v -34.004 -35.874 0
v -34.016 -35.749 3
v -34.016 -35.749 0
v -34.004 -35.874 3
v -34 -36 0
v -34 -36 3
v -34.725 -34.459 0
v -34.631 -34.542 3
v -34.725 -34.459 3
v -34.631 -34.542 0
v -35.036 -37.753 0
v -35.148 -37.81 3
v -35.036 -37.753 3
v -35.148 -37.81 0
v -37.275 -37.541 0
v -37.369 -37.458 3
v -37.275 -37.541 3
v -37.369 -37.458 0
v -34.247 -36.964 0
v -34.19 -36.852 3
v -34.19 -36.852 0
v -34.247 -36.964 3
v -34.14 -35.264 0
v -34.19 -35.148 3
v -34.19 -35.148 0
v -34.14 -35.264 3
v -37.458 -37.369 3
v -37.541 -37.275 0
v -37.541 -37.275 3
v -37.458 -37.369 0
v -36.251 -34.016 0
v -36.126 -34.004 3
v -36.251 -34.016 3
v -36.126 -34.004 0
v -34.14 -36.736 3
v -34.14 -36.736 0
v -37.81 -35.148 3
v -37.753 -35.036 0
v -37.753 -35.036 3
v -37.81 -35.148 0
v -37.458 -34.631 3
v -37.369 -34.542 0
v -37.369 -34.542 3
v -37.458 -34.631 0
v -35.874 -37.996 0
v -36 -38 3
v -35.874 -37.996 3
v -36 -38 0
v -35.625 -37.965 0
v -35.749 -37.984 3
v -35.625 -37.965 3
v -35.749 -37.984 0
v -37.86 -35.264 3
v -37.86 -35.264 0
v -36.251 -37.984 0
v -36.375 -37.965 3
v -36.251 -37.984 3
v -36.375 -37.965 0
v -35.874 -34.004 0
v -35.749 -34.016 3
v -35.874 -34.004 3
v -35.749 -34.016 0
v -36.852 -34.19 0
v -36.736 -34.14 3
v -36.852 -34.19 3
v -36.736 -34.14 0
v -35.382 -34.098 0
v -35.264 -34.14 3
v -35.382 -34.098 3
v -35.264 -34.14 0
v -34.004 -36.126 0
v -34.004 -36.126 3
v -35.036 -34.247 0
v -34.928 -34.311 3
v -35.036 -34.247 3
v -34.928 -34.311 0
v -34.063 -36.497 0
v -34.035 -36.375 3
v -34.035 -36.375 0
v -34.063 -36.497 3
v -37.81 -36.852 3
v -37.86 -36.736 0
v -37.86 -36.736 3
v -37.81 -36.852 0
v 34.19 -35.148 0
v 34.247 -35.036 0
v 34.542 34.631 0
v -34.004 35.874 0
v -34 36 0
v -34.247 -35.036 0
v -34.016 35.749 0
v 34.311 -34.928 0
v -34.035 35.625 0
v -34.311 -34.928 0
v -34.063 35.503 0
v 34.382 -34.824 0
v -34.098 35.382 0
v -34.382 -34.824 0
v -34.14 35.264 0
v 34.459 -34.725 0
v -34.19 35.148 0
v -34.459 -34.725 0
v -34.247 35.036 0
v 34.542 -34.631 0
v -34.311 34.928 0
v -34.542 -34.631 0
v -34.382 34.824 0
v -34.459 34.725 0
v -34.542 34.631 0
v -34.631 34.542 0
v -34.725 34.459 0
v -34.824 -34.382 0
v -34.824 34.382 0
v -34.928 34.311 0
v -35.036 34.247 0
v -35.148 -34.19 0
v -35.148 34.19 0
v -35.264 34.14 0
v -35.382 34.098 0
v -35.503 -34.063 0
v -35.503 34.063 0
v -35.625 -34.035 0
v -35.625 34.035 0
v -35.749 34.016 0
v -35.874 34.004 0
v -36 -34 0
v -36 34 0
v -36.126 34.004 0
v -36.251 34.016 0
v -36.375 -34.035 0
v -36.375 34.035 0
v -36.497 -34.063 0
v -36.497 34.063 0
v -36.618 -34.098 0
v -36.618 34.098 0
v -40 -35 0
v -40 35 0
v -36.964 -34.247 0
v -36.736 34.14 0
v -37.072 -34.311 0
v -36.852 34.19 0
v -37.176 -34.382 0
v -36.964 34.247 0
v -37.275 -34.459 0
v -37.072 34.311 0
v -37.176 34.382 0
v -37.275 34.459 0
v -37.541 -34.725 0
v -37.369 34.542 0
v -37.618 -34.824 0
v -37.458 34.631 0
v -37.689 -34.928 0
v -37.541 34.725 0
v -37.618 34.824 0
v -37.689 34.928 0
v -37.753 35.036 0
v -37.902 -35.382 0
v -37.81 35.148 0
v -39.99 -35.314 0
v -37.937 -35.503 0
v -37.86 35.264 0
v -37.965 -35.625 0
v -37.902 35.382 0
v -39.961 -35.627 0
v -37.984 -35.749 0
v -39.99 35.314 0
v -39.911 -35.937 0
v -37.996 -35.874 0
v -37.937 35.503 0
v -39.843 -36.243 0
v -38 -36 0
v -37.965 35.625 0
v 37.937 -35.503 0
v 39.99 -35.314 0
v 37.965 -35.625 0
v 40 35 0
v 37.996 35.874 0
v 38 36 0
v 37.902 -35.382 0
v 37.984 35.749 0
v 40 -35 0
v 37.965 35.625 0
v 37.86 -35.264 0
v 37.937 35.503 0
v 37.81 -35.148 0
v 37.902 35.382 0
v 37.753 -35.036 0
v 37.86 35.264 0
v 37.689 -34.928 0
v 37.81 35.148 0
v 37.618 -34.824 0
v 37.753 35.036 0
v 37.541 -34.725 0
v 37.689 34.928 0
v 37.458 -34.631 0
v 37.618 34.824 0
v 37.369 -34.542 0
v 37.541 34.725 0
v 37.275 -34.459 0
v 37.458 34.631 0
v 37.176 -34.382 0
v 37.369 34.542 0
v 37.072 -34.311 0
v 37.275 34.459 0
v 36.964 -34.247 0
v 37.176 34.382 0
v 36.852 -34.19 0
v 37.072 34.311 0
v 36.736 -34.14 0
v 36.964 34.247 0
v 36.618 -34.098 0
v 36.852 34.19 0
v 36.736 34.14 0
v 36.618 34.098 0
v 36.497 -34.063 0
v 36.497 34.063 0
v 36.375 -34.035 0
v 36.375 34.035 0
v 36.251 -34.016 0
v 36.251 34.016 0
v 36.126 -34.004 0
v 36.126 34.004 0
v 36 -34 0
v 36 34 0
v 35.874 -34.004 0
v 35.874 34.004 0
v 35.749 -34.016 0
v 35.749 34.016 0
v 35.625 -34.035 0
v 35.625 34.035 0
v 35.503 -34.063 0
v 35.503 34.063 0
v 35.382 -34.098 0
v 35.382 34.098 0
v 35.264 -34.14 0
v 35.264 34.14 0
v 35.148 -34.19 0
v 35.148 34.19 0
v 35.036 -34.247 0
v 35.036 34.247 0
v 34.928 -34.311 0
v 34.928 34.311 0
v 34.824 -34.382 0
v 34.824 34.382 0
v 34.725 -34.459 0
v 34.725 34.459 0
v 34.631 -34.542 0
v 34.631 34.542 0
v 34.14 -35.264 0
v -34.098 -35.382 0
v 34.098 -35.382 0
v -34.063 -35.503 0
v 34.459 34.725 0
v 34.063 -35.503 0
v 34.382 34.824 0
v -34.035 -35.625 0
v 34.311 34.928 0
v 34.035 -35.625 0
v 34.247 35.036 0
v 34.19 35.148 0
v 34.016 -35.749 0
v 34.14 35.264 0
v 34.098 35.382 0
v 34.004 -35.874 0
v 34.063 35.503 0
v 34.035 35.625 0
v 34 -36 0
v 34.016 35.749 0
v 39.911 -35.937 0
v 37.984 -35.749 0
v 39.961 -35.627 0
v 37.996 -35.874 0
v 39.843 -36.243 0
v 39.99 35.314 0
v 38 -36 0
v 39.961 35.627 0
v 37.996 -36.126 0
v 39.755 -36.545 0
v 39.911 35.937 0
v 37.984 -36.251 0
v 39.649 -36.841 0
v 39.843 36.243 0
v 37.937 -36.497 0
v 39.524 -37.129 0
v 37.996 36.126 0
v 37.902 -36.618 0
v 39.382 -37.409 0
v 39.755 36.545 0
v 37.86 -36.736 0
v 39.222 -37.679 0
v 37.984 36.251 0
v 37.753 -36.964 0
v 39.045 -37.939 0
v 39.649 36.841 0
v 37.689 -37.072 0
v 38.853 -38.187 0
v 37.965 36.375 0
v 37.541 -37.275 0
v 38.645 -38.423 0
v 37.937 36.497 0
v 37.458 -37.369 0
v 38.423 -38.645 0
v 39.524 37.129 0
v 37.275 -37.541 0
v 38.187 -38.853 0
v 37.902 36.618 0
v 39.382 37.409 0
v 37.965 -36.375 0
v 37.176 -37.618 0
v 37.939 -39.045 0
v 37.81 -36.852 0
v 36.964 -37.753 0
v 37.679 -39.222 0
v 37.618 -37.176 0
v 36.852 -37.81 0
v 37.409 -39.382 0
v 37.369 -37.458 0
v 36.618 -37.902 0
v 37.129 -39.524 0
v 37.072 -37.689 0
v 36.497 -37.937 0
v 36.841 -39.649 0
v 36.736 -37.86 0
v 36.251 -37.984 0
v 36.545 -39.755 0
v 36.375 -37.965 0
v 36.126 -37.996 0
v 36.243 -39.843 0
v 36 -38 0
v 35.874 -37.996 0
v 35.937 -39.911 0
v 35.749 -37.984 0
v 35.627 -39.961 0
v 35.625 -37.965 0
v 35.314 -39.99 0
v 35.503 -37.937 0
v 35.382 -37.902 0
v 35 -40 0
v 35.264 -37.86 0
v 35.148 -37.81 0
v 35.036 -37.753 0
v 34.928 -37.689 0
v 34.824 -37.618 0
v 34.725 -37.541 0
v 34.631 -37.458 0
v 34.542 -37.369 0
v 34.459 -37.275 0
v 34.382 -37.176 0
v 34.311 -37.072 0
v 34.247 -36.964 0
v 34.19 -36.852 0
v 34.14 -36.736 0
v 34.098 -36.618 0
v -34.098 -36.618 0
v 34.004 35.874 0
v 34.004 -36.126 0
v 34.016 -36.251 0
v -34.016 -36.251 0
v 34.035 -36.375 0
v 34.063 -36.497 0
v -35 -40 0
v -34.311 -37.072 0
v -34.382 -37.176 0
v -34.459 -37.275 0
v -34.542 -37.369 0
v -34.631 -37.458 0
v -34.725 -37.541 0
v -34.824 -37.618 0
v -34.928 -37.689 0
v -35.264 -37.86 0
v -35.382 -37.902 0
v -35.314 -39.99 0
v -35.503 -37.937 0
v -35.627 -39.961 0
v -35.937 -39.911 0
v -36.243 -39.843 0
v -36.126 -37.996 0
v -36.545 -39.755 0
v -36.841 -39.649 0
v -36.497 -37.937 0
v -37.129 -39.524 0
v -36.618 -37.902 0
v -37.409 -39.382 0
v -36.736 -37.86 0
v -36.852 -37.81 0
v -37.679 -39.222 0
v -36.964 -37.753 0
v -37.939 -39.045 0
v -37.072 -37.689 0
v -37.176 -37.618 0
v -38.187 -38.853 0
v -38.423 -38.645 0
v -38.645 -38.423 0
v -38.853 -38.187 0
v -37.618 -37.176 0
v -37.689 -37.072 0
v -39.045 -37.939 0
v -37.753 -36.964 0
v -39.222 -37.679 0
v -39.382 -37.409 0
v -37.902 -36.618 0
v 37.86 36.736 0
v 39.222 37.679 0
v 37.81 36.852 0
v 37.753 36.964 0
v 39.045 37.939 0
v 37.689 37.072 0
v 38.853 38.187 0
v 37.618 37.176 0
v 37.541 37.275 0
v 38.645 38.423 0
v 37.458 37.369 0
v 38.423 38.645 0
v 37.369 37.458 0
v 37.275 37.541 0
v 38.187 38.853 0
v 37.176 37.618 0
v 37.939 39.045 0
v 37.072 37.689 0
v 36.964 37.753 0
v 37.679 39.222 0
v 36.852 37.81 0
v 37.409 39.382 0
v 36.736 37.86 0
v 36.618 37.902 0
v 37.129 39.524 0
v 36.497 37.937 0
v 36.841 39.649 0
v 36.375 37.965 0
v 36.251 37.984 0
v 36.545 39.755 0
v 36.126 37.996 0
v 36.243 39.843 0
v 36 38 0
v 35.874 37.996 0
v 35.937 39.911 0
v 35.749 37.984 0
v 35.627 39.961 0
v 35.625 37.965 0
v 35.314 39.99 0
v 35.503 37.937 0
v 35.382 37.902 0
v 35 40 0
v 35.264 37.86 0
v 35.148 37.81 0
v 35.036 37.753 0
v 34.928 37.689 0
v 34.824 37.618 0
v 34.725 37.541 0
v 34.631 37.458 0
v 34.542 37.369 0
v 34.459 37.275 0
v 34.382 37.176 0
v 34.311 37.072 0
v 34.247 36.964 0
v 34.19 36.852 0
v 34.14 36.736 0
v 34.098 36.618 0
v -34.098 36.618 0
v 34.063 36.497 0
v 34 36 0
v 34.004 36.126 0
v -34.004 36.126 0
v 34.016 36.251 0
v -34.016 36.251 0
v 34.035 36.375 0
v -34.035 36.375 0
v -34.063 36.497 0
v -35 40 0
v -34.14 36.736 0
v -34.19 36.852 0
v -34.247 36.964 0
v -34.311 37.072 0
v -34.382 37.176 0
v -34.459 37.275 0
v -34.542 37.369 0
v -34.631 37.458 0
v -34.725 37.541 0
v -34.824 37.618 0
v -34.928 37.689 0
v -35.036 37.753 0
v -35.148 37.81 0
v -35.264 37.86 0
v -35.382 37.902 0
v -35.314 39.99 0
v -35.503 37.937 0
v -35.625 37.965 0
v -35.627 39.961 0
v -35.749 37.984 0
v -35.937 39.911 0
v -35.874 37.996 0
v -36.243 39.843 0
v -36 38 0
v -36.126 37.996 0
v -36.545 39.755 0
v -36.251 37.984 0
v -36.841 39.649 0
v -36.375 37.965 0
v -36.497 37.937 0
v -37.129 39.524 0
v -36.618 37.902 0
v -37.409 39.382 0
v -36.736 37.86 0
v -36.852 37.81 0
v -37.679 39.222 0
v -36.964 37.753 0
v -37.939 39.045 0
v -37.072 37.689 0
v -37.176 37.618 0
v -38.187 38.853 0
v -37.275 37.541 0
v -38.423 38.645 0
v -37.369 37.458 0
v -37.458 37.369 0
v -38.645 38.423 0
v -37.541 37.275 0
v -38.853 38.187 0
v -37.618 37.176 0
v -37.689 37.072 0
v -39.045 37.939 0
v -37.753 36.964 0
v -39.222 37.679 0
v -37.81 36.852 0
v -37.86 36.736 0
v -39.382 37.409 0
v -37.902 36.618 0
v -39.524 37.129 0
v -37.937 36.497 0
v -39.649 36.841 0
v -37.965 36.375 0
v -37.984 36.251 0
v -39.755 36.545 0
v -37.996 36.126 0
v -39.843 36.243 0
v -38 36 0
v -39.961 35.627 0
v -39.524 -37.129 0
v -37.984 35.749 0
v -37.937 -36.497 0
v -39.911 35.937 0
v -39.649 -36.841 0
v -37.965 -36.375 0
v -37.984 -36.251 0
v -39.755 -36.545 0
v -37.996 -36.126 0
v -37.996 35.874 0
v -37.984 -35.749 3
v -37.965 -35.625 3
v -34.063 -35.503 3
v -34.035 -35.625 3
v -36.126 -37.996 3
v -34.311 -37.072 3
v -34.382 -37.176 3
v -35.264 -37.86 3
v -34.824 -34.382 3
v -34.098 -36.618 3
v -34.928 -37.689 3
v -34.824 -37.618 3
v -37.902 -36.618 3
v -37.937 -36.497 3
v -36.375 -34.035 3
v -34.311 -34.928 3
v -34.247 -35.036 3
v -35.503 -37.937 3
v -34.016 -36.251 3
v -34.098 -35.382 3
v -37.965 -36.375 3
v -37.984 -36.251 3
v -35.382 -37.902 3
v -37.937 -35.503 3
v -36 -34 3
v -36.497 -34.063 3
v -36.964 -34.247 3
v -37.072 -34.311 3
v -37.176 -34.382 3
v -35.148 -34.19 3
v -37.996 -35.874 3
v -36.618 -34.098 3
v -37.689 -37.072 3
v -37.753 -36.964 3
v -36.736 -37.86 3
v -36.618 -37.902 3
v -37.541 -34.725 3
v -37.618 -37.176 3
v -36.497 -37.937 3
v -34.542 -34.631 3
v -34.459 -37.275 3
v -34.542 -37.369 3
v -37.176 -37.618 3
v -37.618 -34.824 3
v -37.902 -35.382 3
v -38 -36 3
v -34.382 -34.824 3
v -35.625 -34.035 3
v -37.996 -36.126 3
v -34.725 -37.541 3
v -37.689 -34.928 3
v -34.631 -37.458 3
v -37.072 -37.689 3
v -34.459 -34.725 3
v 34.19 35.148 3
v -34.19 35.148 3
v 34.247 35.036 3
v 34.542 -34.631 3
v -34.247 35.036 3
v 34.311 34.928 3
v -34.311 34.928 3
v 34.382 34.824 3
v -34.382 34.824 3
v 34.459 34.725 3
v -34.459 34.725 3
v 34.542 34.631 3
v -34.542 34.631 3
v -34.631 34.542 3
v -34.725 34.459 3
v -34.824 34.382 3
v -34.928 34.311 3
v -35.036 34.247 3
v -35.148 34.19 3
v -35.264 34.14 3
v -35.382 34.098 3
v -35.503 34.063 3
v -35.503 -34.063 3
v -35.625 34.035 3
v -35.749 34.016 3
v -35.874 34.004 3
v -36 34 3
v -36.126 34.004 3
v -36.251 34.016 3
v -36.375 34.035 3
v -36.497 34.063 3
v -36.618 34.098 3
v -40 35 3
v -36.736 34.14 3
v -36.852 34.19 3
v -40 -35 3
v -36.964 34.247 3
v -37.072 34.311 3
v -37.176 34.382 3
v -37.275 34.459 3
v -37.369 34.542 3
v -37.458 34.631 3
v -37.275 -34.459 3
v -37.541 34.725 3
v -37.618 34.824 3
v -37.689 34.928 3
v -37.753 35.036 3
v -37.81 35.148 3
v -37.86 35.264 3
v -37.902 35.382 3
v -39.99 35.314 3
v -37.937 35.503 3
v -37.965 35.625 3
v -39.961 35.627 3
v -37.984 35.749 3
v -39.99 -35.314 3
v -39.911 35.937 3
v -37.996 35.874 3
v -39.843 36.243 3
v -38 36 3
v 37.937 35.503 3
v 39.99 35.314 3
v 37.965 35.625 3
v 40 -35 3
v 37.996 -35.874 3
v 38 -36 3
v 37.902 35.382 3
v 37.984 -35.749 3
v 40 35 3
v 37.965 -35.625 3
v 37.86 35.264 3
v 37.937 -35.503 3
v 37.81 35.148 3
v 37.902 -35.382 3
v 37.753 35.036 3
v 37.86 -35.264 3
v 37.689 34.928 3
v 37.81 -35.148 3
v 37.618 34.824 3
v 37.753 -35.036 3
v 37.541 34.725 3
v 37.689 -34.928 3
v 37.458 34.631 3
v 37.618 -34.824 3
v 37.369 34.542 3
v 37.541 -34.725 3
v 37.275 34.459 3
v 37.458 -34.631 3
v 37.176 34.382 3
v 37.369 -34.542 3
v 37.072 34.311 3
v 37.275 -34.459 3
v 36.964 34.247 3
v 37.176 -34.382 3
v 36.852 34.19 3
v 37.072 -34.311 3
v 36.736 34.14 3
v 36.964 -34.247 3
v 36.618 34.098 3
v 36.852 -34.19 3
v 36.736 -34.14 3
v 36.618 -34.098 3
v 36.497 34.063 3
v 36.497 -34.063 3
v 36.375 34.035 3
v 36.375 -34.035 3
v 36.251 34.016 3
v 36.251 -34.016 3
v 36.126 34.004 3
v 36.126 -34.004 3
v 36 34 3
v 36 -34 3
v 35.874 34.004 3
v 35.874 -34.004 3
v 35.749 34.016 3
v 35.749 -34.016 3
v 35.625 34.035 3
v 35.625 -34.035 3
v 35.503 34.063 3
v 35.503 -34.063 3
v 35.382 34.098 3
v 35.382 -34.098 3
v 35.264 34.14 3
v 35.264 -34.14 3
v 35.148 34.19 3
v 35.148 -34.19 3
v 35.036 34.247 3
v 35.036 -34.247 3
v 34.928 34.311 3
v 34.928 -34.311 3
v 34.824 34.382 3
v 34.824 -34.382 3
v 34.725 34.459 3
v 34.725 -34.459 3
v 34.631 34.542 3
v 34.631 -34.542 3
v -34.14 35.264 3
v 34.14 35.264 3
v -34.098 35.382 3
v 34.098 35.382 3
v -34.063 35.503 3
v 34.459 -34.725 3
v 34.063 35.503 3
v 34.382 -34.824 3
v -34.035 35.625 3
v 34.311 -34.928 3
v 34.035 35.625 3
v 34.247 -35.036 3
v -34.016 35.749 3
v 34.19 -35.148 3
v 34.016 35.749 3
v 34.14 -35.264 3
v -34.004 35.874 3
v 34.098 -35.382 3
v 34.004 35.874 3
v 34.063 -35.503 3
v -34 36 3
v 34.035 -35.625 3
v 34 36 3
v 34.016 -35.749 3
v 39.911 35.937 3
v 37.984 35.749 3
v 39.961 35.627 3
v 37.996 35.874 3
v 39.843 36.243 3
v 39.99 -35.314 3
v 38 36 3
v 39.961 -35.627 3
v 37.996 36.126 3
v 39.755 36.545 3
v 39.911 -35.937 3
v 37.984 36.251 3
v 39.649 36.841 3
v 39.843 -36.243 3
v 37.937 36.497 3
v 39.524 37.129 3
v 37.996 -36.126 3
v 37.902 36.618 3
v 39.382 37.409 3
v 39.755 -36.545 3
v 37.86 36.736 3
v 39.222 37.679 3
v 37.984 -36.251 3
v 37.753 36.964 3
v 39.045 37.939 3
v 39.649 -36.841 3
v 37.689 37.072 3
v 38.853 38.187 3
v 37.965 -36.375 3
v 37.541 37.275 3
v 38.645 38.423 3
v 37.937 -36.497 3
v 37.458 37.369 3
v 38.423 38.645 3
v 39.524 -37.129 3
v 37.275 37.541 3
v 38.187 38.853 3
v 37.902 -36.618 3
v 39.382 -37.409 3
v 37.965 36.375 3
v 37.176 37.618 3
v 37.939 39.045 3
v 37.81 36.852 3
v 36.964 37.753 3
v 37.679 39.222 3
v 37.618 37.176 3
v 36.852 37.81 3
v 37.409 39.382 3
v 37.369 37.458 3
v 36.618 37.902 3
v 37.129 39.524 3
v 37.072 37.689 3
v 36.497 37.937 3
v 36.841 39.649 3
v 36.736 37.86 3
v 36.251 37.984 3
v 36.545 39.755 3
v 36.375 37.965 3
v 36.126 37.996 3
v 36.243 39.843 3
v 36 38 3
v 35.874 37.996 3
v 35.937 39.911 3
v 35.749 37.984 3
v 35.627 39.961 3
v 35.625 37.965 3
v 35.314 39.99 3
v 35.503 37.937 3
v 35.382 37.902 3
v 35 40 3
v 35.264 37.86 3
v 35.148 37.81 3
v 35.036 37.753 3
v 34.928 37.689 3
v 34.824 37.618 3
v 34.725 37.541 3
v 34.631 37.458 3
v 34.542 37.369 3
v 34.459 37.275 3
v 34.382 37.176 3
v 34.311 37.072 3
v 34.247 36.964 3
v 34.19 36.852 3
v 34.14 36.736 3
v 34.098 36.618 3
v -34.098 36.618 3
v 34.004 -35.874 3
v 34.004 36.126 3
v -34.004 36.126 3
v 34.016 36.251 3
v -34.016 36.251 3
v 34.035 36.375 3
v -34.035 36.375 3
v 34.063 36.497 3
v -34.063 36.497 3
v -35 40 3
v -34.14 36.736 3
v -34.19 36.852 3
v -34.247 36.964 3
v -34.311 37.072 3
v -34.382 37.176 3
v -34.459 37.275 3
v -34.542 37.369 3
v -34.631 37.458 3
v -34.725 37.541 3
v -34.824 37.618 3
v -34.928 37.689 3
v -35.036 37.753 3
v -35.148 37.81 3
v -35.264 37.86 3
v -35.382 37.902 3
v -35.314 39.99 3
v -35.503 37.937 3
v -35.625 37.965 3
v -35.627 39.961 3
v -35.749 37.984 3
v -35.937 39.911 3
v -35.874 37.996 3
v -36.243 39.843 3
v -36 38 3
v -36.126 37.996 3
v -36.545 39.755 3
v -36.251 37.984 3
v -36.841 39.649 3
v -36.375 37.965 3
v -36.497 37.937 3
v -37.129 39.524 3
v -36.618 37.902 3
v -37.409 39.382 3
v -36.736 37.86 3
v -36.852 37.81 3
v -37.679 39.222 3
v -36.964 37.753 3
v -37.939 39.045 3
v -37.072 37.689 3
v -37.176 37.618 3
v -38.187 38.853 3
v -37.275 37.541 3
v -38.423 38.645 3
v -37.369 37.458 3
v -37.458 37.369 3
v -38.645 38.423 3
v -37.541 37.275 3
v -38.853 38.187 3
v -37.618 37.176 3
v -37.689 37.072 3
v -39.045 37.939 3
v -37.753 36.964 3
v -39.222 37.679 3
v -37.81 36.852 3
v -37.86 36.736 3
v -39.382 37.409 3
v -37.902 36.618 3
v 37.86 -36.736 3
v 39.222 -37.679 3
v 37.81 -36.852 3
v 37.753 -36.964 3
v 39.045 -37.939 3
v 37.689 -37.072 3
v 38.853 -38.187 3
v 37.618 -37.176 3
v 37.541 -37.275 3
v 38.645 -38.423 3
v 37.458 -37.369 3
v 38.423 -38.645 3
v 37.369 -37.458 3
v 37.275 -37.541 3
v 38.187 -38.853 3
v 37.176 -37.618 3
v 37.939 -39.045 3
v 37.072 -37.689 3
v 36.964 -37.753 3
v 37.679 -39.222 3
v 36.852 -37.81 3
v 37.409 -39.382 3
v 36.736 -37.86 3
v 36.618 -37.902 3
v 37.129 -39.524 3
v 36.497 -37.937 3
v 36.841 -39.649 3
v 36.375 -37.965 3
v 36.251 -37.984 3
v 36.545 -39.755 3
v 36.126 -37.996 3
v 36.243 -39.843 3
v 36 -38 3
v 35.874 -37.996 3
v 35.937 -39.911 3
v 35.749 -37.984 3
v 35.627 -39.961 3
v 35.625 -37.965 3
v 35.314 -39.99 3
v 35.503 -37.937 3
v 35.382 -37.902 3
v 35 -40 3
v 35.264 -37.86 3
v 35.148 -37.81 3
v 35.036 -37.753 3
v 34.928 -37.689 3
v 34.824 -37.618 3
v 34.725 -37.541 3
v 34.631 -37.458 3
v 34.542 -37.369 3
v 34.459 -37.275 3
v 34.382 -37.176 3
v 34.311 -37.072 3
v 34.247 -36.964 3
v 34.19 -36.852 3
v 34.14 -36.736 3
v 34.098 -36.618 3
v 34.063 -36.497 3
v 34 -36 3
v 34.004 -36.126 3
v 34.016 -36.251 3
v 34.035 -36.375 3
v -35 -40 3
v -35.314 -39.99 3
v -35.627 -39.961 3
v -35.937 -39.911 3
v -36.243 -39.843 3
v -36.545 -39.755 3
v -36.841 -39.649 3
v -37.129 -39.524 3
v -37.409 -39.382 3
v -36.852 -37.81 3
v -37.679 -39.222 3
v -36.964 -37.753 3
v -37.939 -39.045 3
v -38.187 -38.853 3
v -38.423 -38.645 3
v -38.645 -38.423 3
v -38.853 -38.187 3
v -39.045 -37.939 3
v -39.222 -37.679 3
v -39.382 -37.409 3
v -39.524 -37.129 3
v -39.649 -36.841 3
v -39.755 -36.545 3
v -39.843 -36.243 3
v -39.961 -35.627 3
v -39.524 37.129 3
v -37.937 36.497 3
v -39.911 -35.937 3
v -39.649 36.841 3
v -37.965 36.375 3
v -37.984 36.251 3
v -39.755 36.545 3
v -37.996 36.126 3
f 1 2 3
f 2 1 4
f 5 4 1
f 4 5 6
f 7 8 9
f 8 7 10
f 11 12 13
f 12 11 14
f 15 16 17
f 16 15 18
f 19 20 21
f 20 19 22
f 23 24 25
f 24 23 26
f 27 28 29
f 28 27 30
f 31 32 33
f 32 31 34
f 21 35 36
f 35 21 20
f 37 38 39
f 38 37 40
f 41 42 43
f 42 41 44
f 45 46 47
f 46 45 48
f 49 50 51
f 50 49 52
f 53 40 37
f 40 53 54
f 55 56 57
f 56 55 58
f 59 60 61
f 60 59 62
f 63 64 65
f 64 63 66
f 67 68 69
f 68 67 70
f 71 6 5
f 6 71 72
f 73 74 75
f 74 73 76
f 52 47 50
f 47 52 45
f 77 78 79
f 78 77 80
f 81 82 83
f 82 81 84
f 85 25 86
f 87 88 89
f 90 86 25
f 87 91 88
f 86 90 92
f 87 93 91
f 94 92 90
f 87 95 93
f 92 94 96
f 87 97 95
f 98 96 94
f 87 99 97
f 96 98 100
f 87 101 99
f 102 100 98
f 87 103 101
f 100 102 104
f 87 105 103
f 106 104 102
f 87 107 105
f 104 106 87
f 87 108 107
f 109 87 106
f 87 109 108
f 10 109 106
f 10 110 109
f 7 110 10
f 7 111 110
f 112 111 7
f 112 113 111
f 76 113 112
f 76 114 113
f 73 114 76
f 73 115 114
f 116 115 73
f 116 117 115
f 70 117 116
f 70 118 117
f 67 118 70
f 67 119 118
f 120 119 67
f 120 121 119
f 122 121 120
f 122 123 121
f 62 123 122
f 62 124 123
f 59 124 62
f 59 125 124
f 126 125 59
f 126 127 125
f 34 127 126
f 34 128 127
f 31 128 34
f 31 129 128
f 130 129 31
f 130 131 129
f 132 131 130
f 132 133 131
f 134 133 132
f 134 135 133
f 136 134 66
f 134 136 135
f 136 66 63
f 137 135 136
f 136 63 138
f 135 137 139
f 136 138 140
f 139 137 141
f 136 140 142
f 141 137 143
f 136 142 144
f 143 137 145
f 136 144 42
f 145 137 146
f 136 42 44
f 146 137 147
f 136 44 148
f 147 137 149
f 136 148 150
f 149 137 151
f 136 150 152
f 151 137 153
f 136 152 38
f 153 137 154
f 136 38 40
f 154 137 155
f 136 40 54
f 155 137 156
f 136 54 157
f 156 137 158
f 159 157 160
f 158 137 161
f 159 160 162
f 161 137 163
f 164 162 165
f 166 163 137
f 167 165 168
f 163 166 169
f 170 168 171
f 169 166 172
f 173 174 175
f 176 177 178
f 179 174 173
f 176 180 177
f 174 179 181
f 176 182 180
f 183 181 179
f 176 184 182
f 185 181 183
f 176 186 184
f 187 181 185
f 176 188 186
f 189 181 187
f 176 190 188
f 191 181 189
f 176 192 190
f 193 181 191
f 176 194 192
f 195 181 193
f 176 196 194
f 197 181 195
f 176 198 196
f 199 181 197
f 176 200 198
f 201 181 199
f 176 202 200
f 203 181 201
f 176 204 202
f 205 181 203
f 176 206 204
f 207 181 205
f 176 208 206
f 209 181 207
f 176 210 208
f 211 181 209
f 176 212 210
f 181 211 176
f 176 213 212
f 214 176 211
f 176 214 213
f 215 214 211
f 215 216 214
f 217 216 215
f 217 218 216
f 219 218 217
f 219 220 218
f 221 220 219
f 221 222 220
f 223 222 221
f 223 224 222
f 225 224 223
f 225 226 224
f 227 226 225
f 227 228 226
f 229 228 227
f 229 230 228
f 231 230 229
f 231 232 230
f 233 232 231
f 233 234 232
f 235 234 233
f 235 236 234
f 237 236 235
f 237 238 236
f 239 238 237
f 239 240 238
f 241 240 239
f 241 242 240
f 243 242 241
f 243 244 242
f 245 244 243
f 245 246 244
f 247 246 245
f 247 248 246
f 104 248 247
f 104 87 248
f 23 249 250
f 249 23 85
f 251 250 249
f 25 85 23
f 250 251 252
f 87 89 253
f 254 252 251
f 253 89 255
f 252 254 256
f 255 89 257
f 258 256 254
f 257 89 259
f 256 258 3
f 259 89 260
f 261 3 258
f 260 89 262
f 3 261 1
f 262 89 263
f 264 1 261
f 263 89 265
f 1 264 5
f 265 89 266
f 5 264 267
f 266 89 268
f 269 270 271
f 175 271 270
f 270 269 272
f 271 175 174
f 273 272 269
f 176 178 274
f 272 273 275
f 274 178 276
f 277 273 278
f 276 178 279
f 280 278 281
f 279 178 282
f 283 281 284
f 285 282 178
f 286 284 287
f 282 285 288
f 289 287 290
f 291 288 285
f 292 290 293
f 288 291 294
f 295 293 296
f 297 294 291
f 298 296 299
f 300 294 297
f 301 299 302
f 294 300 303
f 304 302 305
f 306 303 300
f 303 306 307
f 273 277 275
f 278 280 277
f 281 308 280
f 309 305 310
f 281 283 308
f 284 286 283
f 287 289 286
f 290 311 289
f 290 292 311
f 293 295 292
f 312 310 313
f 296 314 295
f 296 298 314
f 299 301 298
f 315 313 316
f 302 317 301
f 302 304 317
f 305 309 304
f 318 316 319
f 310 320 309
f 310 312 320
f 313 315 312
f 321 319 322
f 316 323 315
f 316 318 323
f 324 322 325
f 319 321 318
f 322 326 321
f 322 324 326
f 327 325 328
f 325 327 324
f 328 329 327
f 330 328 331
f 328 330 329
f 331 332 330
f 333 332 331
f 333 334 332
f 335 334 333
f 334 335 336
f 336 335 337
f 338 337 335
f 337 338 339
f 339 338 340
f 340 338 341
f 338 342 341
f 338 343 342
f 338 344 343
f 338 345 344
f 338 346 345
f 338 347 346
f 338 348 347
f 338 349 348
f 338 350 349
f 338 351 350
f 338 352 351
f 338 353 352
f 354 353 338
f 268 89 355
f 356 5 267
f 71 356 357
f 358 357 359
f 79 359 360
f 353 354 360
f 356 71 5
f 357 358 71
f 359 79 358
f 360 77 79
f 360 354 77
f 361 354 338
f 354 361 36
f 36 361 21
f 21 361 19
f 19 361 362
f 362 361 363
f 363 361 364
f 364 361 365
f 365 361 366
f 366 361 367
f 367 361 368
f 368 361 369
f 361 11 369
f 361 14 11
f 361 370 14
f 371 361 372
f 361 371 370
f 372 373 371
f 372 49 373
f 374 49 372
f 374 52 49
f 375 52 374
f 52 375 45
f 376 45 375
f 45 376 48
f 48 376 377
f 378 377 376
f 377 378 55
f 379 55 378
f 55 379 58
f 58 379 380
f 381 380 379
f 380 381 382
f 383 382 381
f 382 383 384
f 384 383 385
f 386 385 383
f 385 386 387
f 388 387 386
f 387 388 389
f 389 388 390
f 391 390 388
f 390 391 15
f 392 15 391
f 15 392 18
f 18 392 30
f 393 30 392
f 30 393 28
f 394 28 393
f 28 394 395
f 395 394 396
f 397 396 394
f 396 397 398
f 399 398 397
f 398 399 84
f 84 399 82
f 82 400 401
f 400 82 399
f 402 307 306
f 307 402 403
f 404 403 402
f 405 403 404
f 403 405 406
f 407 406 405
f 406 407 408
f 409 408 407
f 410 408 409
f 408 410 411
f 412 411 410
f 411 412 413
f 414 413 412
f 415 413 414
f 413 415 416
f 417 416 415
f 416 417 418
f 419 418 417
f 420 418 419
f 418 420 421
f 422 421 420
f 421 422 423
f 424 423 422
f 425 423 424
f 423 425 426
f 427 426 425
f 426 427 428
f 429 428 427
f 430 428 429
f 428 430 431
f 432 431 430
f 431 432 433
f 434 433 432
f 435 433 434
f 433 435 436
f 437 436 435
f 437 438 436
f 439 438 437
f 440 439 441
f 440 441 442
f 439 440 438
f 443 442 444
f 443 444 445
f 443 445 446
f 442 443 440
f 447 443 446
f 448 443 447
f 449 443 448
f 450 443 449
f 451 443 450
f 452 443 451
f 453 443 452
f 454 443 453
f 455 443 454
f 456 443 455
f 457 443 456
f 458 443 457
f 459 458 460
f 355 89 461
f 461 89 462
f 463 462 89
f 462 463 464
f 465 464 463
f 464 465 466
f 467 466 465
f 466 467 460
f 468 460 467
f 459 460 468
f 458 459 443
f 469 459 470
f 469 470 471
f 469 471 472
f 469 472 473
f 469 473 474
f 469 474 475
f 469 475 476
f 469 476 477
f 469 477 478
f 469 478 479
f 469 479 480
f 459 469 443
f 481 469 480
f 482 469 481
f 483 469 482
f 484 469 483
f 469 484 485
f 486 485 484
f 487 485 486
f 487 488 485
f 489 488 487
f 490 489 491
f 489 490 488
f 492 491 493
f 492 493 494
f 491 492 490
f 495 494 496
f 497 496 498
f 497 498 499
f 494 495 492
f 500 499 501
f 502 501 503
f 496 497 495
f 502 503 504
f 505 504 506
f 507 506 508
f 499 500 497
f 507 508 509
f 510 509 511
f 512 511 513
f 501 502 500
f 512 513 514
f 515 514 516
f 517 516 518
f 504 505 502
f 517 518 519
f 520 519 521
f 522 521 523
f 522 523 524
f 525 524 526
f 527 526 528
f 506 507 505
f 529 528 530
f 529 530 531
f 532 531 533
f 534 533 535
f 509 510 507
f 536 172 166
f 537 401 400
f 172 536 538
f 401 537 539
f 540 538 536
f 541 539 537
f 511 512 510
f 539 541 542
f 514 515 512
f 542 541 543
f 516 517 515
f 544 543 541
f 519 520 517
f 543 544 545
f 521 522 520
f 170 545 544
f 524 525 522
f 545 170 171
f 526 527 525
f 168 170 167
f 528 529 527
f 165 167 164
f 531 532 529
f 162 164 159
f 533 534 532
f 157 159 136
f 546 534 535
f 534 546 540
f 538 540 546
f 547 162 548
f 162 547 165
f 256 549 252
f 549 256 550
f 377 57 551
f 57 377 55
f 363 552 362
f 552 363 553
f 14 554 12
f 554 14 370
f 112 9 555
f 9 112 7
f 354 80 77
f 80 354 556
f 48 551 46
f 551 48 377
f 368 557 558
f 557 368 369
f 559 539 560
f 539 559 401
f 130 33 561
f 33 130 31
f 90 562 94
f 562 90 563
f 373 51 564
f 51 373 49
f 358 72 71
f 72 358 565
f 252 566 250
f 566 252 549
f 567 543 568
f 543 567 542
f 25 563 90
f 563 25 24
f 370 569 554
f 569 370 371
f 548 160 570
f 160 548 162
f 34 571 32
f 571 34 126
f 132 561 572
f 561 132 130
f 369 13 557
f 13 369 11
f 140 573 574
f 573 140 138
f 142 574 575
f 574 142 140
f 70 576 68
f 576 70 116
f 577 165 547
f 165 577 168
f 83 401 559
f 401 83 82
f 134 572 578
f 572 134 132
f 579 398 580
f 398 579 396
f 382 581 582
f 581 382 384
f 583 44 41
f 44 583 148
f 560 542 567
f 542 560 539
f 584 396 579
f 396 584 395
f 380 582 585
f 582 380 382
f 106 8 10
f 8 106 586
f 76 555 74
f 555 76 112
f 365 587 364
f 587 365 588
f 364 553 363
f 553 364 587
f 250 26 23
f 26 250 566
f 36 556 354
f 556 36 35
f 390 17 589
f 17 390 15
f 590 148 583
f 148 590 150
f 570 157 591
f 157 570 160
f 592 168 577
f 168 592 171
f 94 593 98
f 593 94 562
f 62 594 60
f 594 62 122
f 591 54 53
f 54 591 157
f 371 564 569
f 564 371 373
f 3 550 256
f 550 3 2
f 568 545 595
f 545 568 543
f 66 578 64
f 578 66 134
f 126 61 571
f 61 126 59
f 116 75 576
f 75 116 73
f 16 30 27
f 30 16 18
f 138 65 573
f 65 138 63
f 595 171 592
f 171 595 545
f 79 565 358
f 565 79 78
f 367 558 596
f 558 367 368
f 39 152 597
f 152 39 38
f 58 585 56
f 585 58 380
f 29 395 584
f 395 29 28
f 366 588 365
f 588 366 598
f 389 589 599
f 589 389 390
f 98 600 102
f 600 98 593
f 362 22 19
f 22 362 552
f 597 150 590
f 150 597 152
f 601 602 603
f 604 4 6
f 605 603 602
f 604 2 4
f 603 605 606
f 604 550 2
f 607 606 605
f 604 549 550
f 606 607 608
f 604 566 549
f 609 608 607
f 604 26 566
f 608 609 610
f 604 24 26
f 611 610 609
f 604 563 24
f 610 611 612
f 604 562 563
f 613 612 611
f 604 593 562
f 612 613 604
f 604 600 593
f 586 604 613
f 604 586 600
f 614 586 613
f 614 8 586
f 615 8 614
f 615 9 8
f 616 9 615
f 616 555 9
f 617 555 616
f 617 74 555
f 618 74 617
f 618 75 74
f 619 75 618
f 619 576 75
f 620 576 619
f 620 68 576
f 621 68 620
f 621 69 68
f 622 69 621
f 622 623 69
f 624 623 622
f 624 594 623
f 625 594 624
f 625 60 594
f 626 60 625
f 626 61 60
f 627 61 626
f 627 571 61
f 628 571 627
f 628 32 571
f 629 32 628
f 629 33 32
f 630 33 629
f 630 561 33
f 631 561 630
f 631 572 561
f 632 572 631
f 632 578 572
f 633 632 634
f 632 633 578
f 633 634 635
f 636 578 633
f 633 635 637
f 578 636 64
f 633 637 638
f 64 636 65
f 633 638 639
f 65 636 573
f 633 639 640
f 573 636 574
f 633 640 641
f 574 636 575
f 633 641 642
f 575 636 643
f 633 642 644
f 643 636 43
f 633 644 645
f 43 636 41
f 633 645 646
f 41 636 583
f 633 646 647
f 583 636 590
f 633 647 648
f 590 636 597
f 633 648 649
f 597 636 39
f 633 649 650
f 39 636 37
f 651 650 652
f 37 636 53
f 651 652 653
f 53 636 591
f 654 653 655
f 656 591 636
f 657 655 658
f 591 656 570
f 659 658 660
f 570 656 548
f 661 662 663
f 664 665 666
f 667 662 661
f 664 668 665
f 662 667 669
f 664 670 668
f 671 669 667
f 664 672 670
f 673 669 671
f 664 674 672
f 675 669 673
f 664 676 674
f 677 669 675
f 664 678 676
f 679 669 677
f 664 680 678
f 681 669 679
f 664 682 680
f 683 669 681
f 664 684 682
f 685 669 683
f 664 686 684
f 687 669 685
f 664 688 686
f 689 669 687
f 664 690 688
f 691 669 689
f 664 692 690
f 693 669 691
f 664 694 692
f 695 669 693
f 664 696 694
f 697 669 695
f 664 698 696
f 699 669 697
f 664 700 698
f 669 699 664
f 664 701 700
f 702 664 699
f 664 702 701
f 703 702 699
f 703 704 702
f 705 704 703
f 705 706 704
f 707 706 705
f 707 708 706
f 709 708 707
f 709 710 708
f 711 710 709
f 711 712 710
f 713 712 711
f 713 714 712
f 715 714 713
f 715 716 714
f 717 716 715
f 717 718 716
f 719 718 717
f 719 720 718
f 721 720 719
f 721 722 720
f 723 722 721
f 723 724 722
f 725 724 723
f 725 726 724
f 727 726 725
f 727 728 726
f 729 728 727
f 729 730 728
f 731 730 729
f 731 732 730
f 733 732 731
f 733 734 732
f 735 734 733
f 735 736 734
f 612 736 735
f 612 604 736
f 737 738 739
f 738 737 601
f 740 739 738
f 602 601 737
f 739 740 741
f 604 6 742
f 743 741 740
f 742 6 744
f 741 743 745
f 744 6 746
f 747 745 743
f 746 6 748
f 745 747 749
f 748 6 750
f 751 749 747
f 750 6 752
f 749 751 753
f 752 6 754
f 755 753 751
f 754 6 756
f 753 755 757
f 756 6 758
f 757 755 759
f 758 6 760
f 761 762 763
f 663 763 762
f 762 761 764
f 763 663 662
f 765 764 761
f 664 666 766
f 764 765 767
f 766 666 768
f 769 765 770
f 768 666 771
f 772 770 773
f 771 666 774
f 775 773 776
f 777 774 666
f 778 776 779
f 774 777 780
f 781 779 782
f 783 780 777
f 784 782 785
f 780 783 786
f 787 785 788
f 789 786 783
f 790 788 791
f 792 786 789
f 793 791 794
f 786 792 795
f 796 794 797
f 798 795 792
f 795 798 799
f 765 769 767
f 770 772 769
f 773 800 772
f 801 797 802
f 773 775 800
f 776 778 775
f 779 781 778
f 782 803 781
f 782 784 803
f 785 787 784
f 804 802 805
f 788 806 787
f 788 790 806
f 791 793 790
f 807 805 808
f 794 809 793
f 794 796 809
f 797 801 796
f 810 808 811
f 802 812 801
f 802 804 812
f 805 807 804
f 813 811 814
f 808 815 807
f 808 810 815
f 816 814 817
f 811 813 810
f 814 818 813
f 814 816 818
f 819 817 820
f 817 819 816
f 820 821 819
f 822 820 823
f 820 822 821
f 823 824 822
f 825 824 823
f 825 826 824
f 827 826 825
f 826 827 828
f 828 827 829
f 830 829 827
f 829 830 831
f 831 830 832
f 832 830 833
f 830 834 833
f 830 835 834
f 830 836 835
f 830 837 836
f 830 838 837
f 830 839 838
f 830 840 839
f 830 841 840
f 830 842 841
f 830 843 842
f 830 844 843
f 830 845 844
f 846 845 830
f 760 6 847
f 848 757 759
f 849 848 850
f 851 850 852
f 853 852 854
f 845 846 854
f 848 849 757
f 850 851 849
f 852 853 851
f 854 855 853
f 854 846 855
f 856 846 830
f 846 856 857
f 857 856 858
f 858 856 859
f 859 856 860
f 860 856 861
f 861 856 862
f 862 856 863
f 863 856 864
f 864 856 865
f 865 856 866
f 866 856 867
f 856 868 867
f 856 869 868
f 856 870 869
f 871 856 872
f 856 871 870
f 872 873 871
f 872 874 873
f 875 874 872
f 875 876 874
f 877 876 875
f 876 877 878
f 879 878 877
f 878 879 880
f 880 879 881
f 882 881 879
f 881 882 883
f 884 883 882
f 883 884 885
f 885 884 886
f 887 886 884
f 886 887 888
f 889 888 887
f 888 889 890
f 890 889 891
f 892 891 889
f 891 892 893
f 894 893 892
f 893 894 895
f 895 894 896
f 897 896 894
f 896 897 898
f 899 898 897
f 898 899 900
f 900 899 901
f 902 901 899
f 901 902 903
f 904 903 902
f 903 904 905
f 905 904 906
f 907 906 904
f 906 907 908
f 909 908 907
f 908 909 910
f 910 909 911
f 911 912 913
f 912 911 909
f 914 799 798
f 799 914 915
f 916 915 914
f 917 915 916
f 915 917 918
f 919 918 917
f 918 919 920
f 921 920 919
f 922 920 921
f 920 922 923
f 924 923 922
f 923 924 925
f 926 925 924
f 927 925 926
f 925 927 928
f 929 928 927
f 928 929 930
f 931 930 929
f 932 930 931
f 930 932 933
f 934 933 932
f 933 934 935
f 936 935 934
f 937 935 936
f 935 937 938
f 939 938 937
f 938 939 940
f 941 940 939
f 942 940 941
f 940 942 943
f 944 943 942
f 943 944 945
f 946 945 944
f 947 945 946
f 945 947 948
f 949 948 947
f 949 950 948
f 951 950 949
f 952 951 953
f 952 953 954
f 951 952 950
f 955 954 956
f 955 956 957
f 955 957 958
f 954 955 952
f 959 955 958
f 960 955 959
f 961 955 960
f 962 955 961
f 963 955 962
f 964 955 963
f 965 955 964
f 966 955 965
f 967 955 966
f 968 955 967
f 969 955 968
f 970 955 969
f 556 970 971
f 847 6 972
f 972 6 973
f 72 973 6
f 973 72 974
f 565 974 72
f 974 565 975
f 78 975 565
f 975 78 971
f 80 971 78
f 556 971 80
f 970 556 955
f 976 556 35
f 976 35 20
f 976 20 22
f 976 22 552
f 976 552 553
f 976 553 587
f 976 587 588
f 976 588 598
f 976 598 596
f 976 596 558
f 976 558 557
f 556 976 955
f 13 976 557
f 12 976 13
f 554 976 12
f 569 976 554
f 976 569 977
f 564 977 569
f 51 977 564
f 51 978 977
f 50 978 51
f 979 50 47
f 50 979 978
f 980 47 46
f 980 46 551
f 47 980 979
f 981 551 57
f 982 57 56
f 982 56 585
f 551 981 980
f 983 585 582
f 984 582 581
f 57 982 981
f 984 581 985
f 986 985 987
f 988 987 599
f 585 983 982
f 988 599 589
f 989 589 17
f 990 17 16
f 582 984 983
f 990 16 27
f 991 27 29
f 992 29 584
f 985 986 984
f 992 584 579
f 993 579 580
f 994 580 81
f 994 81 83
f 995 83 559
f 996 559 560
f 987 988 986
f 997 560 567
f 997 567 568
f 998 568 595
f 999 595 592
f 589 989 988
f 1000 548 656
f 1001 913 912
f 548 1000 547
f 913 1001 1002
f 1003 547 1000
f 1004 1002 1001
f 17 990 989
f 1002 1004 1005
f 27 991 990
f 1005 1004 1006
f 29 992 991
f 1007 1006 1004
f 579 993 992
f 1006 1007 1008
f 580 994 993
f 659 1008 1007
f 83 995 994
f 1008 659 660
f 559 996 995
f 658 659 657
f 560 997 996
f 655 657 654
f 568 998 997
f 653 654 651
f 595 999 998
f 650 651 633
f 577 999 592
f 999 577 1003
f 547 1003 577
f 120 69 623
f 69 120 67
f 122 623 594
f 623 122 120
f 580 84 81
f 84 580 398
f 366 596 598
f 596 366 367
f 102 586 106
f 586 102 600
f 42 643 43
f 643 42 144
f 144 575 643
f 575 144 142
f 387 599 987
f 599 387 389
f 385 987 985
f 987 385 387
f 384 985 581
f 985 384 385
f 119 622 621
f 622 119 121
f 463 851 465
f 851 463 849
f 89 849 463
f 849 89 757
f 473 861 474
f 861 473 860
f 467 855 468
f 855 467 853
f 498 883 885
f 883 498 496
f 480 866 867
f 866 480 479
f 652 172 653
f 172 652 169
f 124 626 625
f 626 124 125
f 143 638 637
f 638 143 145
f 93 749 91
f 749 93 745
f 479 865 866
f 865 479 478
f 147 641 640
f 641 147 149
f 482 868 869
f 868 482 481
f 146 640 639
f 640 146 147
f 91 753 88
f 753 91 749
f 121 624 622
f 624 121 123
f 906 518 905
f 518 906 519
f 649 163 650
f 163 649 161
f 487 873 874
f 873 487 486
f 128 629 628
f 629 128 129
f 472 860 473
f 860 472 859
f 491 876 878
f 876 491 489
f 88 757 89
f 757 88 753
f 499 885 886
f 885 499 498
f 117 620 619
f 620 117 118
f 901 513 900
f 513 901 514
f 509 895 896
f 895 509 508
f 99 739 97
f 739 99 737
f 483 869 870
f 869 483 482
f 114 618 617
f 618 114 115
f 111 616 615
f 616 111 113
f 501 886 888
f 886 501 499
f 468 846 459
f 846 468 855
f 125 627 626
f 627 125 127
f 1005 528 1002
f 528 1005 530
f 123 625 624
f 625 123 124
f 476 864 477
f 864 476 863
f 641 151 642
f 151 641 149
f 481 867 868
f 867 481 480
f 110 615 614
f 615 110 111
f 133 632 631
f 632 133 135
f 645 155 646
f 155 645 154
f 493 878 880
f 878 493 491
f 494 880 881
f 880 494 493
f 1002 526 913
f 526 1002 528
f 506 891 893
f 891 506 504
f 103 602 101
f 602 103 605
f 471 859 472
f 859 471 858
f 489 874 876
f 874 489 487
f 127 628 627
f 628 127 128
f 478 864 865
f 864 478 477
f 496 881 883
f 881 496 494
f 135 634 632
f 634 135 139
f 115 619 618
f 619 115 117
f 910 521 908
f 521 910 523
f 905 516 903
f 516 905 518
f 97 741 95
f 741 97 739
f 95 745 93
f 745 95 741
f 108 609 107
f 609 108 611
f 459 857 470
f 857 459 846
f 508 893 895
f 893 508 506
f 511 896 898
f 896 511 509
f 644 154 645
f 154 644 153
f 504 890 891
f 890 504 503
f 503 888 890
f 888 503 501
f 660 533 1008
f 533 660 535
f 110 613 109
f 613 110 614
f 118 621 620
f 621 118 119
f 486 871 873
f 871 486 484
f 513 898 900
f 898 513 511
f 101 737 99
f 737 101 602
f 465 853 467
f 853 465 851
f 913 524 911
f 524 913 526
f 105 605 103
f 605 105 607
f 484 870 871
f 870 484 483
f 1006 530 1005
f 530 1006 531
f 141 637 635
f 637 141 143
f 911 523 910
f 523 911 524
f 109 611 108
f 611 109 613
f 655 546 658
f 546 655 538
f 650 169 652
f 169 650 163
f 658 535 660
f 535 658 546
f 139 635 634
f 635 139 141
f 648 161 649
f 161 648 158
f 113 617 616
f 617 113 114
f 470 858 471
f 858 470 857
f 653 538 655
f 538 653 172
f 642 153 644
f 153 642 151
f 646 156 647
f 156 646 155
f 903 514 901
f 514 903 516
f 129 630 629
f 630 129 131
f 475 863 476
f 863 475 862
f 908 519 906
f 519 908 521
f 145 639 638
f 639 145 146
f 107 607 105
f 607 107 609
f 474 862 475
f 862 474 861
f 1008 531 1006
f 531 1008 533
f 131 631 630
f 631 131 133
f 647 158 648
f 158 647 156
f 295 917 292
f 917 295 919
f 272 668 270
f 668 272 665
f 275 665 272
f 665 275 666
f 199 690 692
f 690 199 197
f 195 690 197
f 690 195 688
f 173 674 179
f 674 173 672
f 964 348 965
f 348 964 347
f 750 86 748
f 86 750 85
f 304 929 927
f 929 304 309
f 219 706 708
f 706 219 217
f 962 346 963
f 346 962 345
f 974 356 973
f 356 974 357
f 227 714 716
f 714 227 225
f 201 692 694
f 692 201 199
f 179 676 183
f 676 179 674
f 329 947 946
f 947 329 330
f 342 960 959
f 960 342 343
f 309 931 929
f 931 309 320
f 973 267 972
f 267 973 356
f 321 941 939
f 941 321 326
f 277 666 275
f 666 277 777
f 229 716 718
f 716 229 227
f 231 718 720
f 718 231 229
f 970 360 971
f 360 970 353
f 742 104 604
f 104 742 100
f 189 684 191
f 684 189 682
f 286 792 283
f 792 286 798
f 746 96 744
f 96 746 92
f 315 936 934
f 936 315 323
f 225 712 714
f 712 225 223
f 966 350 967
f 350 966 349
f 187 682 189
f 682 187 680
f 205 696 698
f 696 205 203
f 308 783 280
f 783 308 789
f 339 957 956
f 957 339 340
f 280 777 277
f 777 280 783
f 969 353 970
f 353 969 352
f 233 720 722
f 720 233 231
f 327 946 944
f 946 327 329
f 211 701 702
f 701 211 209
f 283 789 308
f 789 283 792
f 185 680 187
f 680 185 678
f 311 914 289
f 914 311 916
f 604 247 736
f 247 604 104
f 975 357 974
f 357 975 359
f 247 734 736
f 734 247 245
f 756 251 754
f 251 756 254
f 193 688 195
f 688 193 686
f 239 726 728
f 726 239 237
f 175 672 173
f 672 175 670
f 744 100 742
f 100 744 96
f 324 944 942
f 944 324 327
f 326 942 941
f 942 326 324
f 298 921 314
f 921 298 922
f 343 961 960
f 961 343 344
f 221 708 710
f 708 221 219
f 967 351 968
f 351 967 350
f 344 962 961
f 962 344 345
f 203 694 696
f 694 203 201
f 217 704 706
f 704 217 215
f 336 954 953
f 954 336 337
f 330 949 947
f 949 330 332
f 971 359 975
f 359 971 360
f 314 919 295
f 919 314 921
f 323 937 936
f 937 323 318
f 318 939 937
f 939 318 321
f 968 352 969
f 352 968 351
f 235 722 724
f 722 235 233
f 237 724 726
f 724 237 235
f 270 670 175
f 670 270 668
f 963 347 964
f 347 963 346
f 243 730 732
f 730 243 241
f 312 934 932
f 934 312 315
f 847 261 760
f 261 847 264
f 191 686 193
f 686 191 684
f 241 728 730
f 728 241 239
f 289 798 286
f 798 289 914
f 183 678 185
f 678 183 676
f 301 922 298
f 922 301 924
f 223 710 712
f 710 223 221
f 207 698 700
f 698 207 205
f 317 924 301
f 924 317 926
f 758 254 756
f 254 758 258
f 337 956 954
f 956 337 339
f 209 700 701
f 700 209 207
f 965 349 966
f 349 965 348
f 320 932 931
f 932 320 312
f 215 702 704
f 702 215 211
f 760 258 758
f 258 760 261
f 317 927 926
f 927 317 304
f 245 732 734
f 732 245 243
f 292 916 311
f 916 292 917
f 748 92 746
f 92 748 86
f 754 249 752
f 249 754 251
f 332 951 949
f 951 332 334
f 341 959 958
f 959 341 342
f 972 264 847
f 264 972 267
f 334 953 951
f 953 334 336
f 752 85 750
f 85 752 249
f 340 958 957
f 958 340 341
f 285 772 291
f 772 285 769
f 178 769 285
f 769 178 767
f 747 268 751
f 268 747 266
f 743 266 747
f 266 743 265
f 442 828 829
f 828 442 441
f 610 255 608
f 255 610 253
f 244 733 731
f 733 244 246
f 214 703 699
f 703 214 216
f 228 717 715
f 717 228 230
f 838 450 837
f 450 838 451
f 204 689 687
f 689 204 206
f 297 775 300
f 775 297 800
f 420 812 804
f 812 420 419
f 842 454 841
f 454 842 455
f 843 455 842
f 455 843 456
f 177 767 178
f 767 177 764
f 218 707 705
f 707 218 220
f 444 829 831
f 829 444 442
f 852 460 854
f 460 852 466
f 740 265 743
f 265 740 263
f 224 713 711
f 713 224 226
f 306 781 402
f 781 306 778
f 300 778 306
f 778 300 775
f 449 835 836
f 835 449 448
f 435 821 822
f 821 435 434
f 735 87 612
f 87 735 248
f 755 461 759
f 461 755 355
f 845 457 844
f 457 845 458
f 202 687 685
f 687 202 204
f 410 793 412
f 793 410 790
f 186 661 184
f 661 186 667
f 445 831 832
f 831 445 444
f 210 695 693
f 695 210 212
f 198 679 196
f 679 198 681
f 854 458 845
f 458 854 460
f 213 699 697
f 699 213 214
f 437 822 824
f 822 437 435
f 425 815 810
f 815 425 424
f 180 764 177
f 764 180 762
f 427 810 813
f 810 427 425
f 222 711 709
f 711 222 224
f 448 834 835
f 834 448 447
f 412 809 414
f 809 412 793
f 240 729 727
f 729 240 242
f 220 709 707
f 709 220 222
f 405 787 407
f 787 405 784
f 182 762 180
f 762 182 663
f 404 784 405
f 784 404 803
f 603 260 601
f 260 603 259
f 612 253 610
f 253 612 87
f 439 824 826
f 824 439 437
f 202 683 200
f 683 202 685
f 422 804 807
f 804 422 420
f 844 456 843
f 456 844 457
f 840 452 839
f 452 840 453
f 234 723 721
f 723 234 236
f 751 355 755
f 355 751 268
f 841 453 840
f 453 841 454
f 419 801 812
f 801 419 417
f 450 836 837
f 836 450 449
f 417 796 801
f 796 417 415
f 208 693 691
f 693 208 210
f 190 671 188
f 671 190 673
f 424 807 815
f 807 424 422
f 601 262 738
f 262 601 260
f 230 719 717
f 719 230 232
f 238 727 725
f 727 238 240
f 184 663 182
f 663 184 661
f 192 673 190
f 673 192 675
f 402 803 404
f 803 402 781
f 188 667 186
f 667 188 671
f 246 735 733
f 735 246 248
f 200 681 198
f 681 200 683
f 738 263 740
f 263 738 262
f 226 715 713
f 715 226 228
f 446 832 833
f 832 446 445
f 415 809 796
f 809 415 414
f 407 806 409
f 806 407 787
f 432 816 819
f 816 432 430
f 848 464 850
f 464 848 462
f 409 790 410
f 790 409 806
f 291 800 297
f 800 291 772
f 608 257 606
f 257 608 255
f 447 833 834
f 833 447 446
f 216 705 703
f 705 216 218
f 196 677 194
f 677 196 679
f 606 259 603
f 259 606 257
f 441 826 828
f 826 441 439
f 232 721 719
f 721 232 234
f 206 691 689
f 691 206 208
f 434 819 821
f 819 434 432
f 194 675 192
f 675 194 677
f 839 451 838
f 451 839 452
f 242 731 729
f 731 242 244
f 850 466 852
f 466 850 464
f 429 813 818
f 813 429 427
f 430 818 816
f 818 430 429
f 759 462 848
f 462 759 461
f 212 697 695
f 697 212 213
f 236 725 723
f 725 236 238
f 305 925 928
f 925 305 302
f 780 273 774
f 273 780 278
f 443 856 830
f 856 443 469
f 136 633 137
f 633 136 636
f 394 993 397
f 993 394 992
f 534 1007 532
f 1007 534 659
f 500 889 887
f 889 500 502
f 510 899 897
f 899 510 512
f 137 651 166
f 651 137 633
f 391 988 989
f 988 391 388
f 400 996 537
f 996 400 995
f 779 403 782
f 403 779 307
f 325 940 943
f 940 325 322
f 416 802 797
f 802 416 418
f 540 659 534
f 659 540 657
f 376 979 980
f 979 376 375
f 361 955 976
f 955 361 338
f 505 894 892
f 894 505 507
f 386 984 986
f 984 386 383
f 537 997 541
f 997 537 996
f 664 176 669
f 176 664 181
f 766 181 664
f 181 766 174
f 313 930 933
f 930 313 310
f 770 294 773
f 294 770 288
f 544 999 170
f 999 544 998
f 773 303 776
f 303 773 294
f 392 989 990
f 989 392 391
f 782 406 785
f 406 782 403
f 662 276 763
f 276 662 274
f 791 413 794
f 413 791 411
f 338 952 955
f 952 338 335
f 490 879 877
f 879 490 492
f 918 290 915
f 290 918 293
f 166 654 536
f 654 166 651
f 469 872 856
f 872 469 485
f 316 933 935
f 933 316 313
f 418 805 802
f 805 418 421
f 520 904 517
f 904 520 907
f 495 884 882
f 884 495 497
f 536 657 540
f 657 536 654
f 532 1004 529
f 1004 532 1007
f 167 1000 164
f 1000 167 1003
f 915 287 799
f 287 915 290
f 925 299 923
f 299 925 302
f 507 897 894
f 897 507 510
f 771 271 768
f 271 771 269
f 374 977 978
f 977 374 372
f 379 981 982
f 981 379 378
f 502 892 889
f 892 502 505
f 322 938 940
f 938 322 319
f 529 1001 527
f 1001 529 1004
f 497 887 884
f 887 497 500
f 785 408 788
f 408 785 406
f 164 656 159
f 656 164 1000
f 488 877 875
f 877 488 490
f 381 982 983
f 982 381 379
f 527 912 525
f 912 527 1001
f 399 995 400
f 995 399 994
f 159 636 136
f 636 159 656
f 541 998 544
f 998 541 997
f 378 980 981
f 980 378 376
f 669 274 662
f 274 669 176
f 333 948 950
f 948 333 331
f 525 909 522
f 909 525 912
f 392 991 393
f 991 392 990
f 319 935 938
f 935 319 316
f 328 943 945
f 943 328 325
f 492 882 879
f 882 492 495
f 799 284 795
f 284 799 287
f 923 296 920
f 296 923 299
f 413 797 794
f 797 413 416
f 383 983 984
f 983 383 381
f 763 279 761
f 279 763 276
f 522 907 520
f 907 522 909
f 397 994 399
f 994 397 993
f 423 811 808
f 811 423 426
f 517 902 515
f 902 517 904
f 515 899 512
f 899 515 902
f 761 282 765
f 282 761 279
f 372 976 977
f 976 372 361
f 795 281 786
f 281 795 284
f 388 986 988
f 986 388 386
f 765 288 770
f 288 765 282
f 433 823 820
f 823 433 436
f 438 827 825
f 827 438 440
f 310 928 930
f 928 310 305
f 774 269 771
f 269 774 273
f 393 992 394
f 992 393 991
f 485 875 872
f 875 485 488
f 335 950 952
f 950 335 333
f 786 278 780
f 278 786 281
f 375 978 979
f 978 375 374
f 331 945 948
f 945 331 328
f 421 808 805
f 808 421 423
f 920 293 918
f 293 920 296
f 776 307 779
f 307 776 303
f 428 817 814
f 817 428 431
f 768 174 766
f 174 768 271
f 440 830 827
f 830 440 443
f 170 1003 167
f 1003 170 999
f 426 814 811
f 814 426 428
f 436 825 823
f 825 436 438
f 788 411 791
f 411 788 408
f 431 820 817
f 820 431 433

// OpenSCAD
$fn=100;
wall_thickness = 3;

rounding_radius = 5;
plate_size = 80;

screw_hole_diameter = 4;
screw_hole_inset = 4;

module blanking_plate_base() {
    plate_dim = plate_size/2 - rounding_radius;
    ends = [-plate_dim, plate_dim];
    hull() {
        for(x = ends) {
            for(y = ends) {
                translate([x, y, 0]) {
                    cylinder(wall_thickness, r = rounding_radius);
                }
            }
        }
    }
}

module blanking_plate_screw_holes() {
    hole_dim = plate_size/2 - screw_hole_inset;
    holes = [-hole_dim, hole_dim];
    for(x = holes) {
        for(y = holes) {
            translate([x, y, 0]) {
                #cylinder(wall_thickness, d = screw_hole_diameter);
            }
        }
    }
}


module blanking_plate() {
    difference() {
        blanking_plate_base();
        blanking_plate_screw_holes();
    }
}

blanking_plate();
    
    
